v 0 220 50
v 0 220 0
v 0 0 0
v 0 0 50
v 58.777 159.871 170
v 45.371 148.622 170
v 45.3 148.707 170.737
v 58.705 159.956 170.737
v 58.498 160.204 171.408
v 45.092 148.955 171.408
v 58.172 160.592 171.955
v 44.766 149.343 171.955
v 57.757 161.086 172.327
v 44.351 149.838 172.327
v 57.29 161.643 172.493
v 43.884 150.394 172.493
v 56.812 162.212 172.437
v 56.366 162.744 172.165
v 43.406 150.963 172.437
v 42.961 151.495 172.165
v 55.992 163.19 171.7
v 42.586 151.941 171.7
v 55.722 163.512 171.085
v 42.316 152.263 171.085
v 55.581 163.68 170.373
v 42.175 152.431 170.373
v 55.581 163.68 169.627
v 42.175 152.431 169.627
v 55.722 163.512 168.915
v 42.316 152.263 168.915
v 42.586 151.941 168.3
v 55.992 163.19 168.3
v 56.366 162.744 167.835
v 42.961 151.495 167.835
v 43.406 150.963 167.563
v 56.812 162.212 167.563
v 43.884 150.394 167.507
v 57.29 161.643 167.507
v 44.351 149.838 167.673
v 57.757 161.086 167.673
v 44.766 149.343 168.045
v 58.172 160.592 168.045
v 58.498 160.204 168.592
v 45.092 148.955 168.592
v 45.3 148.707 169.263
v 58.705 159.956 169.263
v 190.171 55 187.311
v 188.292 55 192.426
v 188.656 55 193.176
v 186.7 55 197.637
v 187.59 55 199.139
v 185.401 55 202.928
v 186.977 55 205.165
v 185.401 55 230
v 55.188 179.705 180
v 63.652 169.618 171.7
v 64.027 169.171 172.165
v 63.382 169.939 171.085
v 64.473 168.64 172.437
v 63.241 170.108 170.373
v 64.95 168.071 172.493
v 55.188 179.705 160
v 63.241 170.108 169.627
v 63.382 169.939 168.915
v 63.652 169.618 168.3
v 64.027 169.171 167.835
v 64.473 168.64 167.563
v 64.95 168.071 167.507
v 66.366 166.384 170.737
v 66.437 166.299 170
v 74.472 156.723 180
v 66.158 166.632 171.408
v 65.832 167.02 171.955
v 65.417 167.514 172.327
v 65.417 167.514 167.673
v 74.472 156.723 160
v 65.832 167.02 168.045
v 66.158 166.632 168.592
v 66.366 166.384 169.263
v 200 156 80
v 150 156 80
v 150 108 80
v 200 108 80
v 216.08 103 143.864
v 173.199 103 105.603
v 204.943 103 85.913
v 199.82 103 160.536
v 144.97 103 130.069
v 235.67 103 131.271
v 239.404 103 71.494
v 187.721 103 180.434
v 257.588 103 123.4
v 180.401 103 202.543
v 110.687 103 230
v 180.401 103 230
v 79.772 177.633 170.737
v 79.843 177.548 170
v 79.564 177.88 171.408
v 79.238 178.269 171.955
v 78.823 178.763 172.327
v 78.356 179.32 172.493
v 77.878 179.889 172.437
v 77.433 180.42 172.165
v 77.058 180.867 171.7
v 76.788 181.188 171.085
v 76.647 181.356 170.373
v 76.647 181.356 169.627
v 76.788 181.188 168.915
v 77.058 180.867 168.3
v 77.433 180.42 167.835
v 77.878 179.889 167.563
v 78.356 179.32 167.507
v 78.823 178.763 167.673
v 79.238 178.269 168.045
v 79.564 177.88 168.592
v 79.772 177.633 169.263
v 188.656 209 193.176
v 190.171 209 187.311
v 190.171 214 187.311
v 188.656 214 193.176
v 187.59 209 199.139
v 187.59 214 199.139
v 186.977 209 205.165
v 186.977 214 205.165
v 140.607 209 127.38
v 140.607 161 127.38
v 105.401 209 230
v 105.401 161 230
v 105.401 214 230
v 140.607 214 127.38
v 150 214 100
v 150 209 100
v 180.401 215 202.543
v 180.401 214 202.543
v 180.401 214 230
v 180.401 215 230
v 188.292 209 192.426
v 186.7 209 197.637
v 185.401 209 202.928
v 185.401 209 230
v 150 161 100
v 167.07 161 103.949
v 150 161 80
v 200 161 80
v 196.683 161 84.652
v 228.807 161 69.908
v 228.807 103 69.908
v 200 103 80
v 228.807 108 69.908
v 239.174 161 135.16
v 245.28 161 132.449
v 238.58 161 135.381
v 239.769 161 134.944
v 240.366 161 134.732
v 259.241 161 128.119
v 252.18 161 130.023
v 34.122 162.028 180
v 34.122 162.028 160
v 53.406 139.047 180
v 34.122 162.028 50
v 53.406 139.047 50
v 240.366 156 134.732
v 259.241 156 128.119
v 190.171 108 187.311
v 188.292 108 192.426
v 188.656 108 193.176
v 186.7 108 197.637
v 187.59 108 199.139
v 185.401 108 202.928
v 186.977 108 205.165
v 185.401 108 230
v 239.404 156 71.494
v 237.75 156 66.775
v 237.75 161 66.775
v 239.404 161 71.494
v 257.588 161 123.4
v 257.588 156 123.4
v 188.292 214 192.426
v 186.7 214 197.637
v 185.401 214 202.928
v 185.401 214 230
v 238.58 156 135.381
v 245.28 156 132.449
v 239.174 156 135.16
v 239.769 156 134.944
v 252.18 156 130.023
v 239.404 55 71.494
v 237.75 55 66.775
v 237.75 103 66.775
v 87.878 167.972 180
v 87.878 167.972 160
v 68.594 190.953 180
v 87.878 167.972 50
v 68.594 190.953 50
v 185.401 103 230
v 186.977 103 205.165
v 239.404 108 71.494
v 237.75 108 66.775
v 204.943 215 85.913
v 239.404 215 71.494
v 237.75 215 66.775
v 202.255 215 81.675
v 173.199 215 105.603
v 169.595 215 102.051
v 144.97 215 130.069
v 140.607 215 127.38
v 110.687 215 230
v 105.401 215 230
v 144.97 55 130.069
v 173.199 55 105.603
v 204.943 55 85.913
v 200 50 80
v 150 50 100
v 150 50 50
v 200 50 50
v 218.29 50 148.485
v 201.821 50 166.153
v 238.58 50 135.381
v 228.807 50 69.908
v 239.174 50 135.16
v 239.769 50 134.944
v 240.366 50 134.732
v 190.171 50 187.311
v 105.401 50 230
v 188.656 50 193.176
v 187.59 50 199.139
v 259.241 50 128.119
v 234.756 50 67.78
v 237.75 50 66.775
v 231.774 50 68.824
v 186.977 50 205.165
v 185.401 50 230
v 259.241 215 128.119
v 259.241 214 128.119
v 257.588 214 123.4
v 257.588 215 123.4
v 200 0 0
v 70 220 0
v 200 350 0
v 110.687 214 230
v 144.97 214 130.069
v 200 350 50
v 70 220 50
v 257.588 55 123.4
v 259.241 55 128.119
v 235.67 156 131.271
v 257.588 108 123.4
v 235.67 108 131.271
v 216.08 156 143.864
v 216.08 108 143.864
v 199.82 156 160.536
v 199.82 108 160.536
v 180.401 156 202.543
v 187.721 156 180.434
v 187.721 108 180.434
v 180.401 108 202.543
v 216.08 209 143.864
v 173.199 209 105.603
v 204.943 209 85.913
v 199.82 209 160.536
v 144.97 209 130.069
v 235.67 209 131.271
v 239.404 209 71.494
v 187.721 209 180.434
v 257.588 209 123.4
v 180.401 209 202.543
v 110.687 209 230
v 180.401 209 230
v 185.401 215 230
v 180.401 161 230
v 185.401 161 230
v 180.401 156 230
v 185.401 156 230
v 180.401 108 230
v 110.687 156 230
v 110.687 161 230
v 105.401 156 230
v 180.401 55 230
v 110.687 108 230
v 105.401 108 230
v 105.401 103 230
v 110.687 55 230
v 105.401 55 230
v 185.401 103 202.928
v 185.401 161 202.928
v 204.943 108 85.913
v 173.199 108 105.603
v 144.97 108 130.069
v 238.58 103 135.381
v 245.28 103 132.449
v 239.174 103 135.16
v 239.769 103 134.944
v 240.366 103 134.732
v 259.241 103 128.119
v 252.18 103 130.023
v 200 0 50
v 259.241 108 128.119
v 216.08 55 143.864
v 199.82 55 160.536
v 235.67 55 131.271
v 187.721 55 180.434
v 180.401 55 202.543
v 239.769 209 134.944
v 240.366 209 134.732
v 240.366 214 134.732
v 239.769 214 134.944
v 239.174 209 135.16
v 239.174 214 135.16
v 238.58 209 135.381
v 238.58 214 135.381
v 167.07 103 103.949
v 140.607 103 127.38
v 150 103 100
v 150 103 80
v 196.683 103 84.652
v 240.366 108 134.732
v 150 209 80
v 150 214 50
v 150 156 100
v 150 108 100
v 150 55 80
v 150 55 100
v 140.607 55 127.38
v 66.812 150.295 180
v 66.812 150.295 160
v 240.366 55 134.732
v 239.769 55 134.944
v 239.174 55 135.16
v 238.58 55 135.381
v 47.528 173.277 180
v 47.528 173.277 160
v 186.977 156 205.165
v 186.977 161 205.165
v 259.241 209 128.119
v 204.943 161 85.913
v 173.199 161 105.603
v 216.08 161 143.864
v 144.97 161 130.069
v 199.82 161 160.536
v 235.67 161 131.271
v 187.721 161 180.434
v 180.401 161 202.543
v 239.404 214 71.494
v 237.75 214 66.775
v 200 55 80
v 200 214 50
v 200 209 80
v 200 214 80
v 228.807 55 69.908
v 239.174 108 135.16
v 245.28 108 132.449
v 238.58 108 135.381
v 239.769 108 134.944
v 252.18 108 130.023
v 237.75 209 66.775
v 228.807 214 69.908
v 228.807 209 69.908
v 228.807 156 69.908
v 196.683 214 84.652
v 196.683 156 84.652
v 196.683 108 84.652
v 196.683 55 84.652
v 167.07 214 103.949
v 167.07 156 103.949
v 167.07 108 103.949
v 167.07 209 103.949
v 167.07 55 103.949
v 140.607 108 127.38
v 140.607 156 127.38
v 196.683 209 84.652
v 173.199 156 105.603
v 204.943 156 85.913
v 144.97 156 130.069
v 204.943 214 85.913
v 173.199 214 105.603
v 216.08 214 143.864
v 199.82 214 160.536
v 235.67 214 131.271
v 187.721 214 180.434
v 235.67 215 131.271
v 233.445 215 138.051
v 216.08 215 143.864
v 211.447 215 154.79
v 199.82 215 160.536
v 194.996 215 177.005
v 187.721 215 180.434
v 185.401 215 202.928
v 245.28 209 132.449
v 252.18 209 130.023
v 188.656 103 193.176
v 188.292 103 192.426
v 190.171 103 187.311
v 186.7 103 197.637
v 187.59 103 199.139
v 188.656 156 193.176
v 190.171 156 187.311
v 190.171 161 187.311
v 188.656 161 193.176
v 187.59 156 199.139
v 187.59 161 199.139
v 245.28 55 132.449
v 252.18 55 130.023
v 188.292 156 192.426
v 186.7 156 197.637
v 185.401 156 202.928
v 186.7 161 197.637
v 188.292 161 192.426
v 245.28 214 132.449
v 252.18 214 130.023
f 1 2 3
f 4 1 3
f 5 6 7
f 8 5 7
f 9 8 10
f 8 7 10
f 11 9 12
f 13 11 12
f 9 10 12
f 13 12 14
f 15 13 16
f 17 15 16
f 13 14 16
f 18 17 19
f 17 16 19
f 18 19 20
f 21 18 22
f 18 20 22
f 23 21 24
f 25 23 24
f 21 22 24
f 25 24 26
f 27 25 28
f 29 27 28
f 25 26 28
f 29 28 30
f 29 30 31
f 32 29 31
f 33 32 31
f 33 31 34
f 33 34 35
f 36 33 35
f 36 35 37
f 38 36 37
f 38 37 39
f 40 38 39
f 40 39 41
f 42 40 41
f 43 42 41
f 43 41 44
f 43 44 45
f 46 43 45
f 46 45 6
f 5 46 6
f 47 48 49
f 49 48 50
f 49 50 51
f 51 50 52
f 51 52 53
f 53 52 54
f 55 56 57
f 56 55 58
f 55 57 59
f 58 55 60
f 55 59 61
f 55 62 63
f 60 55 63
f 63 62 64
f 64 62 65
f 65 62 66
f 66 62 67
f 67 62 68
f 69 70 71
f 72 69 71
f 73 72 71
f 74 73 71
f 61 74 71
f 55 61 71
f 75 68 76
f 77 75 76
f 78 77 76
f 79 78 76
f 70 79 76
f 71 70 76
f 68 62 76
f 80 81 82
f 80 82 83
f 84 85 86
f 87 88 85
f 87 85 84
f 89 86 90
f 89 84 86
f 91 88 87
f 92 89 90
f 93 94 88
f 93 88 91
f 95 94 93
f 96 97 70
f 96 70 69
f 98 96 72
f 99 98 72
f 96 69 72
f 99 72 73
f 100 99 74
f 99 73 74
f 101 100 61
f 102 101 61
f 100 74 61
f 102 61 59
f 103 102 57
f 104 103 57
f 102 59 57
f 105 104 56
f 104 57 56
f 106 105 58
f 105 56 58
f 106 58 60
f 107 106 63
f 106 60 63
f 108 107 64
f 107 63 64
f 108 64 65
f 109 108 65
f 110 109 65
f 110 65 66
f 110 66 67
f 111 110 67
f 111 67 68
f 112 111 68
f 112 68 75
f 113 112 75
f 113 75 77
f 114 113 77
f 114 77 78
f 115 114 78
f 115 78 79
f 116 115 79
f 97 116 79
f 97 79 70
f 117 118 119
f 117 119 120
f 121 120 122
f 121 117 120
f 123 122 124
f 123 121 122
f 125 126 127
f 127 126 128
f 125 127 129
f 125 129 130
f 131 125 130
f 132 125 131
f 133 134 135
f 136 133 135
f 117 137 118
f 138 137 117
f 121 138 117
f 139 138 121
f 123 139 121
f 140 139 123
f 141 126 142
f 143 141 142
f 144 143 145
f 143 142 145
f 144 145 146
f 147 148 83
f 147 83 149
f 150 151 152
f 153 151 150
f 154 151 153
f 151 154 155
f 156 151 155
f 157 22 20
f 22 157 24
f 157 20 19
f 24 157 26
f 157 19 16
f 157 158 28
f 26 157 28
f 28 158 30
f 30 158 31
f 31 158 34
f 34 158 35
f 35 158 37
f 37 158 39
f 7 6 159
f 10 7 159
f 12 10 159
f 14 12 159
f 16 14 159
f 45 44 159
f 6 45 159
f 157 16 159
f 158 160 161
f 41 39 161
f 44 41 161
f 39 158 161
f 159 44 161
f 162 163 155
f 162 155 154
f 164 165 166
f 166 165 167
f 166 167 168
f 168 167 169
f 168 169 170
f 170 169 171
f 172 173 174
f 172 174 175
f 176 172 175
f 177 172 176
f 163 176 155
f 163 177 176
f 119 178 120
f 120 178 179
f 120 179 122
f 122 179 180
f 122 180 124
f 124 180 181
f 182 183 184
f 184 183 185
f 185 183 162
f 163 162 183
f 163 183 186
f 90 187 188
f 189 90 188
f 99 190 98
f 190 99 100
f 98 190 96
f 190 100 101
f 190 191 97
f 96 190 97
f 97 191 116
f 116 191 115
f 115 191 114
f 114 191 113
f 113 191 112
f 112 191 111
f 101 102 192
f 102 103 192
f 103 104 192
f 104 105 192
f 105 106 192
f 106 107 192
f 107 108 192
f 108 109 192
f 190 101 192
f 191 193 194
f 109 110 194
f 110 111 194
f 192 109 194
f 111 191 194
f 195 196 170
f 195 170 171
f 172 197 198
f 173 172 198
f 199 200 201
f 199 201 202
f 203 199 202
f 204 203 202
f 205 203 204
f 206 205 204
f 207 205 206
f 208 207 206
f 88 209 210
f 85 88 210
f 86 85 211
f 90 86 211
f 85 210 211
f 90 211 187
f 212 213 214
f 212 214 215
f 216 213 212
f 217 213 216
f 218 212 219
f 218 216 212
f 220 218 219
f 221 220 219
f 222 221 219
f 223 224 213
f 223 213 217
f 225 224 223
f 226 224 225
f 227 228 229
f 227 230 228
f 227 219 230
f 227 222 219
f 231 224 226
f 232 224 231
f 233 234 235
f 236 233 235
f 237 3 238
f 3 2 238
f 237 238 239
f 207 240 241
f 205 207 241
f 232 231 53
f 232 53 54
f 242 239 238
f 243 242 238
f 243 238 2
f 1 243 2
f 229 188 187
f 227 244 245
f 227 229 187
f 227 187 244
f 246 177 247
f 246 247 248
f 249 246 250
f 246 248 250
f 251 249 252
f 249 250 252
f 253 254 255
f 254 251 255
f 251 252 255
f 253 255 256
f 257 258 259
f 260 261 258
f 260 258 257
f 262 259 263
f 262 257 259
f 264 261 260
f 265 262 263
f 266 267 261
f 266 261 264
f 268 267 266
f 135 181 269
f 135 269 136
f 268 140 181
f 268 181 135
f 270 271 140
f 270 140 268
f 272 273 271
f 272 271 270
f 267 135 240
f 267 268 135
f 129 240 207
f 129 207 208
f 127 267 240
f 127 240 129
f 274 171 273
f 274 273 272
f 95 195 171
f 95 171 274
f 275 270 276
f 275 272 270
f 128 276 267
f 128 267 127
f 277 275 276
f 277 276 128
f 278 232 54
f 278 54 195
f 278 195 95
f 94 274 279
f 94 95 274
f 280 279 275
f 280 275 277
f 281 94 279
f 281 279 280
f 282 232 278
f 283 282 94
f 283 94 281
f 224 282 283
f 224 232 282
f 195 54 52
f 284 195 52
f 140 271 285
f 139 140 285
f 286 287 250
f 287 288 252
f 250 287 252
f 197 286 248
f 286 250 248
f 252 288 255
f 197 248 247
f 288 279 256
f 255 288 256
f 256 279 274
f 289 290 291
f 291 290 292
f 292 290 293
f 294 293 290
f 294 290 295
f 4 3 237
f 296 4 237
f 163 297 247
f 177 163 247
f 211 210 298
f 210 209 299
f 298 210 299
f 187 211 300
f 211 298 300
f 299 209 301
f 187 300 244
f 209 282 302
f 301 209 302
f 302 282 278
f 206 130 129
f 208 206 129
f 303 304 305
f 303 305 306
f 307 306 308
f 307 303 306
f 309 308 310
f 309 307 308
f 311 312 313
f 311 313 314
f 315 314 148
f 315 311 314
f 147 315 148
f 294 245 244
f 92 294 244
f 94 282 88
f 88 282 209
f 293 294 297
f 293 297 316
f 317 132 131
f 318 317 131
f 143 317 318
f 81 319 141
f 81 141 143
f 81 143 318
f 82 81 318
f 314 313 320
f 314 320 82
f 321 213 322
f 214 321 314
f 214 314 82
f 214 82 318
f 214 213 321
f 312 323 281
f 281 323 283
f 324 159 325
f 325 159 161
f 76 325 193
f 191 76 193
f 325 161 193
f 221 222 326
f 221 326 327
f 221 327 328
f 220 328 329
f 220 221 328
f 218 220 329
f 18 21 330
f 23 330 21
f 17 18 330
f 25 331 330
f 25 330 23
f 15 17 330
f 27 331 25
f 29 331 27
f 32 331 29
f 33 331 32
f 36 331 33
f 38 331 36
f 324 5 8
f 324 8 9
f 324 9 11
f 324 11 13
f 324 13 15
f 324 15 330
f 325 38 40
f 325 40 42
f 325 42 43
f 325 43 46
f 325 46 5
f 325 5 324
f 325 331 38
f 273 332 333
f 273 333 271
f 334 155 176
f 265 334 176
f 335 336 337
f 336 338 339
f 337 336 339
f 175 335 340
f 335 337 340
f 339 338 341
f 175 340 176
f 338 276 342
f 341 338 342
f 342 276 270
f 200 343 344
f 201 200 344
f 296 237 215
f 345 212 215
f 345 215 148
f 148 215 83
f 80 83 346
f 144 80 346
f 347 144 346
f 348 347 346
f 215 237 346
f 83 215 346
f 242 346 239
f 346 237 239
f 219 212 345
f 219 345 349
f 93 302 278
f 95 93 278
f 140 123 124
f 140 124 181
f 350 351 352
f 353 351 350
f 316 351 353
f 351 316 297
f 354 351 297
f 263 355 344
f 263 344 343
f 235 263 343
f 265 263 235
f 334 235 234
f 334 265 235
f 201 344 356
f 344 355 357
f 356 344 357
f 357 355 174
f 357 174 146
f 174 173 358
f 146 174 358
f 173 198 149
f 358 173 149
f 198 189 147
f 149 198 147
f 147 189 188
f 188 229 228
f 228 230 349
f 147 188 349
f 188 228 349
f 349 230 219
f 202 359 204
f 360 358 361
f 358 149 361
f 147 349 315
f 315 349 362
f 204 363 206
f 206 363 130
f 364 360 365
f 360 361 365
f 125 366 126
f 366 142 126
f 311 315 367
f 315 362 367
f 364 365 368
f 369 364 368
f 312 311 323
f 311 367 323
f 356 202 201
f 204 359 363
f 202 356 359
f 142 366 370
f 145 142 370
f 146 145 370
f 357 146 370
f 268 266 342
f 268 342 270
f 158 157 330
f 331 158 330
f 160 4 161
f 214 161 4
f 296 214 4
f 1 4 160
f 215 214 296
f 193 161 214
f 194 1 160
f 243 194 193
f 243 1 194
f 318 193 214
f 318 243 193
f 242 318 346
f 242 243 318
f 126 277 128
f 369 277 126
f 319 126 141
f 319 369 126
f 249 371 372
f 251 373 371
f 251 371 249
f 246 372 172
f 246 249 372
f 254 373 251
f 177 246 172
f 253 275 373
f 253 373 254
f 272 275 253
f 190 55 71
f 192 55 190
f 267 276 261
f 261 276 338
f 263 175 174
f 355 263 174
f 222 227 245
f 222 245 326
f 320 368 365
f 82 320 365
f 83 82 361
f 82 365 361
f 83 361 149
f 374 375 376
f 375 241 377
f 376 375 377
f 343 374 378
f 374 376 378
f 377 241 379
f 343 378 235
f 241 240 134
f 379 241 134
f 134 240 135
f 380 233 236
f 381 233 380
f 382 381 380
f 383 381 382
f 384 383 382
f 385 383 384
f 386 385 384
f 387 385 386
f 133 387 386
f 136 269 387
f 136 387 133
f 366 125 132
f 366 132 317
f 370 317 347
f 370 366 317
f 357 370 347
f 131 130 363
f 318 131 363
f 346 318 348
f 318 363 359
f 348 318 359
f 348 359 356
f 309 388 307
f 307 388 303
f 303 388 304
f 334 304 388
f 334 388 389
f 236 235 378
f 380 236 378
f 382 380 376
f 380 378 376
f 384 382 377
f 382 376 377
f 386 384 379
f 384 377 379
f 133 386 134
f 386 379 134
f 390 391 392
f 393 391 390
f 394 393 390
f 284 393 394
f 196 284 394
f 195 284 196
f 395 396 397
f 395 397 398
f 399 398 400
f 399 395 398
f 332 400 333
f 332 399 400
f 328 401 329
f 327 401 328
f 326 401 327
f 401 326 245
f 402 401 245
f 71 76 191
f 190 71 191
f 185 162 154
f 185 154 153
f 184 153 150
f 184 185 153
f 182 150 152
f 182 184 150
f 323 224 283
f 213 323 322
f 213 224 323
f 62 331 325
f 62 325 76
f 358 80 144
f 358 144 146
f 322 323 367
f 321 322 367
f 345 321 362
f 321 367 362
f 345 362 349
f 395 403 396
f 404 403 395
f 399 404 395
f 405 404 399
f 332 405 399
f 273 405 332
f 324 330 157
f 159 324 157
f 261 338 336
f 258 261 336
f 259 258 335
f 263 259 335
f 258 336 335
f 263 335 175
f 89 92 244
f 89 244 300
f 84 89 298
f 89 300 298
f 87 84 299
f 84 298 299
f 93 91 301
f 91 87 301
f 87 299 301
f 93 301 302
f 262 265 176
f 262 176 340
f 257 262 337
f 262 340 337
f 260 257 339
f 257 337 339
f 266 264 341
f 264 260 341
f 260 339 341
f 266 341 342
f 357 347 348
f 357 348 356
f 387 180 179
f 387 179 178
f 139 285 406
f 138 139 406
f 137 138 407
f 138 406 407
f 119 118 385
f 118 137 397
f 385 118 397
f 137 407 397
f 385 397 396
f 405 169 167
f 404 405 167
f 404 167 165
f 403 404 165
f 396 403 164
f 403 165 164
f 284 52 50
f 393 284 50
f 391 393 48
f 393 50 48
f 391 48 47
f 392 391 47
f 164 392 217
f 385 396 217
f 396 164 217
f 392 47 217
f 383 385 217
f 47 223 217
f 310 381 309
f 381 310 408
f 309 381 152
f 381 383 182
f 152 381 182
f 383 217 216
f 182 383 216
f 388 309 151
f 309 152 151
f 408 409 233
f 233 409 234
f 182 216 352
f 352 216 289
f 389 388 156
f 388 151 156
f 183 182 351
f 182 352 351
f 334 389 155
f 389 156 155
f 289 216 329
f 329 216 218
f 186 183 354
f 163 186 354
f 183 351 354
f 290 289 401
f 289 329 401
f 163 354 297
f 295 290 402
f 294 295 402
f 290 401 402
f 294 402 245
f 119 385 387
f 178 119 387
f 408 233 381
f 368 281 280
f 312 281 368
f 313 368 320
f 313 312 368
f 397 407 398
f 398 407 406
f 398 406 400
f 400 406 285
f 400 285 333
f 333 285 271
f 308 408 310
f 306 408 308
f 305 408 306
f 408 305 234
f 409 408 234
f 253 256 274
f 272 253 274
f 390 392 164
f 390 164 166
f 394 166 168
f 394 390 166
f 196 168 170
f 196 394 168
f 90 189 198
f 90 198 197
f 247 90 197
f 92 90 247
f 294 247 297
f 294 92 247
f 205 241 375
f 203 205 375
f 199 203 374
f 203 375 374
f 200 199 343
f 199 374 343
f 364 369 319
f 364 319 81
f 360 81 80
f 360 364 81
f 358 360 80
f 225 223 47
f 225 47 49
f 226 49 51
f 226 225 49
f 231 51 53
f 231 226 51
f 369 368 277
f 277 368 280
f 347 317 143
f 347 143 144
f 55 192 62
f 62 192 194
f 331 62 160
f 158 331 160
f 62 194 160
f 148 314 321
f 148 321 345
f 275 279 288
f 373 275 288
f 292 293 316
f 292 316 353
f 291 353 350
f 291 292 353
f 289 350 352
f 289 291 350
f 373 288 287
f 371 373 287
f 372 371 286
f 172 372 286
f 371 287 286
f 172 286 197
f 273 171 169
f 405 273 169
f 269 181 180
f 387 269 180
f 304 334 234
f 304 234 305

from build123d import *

# Parameters (mm, degrees)
P_IDAT_VYSUNUT_M1_DEPTH  = 50
SKICA7_W                 = 50
SKICA7_H                 = 164
P_IDAT_VYSUNUT_M5_DEPTH  = 30
P_IDAT_VYSUNUT_M16_DEPTH = 5
LINPOLE1_COUNT           = 4
LINPOLE1_PITCH           = 53
P_IDAT_VYSUNUT_M17_DEPTH = 55
LINPOLE2_COUNT           = 3
LINPOLE2_PITCH           = 55
P_IDAT_VYSUNUT_M18_DEPTH = 110
P_IDAT_VYSUNUT_M19_DEPTH = 20
SKICA29_R                = 2.5
ODEBRAT_VYSUNUT_M1_DEPTH = 387.276474167


with BuildPart() as part:
    # Skica1 → Přidat vysunutím1 (new body)
    with BuildSketch(Plane.XY):
        Polygon((0, 0), (200, 0), (200, 350), (70, 220), (0, 220), align=None)
    extrude(amount=P_IDAT_VYSUNUT_M1_DEPTH)

    # Skica7 → Přidat vysunutím5 (add)
    with BuildSketch(Plane.XY.offset(50)):
        with Locations((175, 132)):
            Rectangle(SKICA7_W, SKICA7_H)
    extrude(amount=P_IDAT_VYSUNUT_M5_DEPTH)

    # Skica23 → Přidat vysunutím16 (add)
    with BuildSketch(Plane.XZ.offset(-50)):
        with BuildLine():
            Line((200, 80), (237.75041097, 66.774778957))
            Line((237.75041097, 66.774778957), (259.241395164, 128.119196783))
            Line((259.241395164, 128.119196783), (240.366189679, 134.731807304))
            ThreePointArc((240.366189679, 134.731807304), (203.062547088, 161.906480142), (186.977305802, 205.164885189))
            Line((186.977305802, 205.164885189), (185.40091467, 230))
            Line((185.40091467, 230), (105.40091467, 230))
            Line((105.40091467, 230), (150, 100))
            Line((150, 100), (150, 80))
            Line((150, 80), (200, 80))
        make_face()
    p_idat_vysunut_m16 = extrude(amount=-P_IDAT_VYSUNUT_M16_DEPTH)

    # LinPole1: Přidat vysunutím16 ×4
    with Locations(*[(0, i * LINPOLE1_PITCH, 0) for i in range(1, LINPOLE1_COUNT)]):
        add(p_idat_vysunut_m16)

    # Skica26 → Přidat vysunutím17 (add)
    with BuildSketch(Plane.XZ.offset(-50)):
        with BuildLine():
            Line((140.606634732, 127.380325757), (105.40091467, 230))
            Line((105.40091467, 230), (110.686974043, 230))
            Line((110.686974043, 230), (144.970270535, 130.069059465))
            ThreePointArc((144.970270535, 130.069059465), (188.679692745, 95.127098247), (239.4035636, 71.493580328))
            Line((239.4035636, 71.493580328), (237.75041097, 66.774778957))
            ThreePointArc((237.75041097, 66.774778957), (185.516396292, 91.207581344), (140.606634732, 127.380325757))
        make_face()
        with BuildLine():
            Line((185.40091467, 230), (185.40091467, 202.92837758))
            ThreePointArc((185.40091467, 202.92837758), (211.446760209, 154.790204461), (259.241395164, 128.119196783))
            Line((259.241395164, 128.119196783), (257.588242534, 123.400395411))
            ThreePointArc((257.588242534, 123.400395411), (207.477117523, 151.738564679), (180.40091467, 202.542658277))
            Line((180.40091467, 202.542658277), (180.40091467, 230))
            Line((180.40091467, 230), (185.40091467, 230))
        make_face()
    p_idat_vysunut_m17 = extrude(amount=-P_IDAT_VYSUNUT_M17_DEPTH)

    # LinPole2: Přidat vysunutím17 ×3
    with Locations(*[(0, i * LINPOLE2_PITCH, 0) for i in range(1, LINPOLE2_COUNT)]):
        add(p_idat_vysunut_m17)

    # Skica27 → Přidat vysunutím18 (add)
    with BuildSketch(Plane.XY.offset(50)):
        Polygon((53.405814175, 139.046612135), (87.877814115, 167.972054571), (68.594185825, 190.953387865), (34.122185885, 162.027945429), align=None)
    extrude(amount=P_IDAT_VYSUNUT_M18_DEPTH)

    # Skica28 → Přidat vysunutím19 (add)
    with BuildSketch(Plane.XY.offset(160)):
        Polygon((55.18840807, 179.704604695), (74.472036361, 156.723271402), (87.877814115, 167.972054571), (68.594185825, 190.953387865), align=None)
        Polygon((47.527963639, 173.276728598), (66.81159193, 150.295395305), (53.405814175, 139.046612135), (34.122185885, 162.027945429), align=None)
    extrude(amount=P_IDAT_VYSUNUT_M19_DEPTH)

    # Skica29 → Odebrat vysunutím1 (cut, through all)
    with BuildSketch(Plane(origin=(99.806909072, 83.747940591, 0), x_dir=(0, 0, 1), z_dir=(-0.7660444431189739, -0.6427876096865444, 0))):
        with Locations(Location((170, 87.187288924, 0), (0, 0, 270))):
            Circle(SKICA29_R)
    extrude(amount=-ODEBRAT_VYSUNUT_M1_DEPTH, mode=Mode.SUBTRACT)


solid = part.part
